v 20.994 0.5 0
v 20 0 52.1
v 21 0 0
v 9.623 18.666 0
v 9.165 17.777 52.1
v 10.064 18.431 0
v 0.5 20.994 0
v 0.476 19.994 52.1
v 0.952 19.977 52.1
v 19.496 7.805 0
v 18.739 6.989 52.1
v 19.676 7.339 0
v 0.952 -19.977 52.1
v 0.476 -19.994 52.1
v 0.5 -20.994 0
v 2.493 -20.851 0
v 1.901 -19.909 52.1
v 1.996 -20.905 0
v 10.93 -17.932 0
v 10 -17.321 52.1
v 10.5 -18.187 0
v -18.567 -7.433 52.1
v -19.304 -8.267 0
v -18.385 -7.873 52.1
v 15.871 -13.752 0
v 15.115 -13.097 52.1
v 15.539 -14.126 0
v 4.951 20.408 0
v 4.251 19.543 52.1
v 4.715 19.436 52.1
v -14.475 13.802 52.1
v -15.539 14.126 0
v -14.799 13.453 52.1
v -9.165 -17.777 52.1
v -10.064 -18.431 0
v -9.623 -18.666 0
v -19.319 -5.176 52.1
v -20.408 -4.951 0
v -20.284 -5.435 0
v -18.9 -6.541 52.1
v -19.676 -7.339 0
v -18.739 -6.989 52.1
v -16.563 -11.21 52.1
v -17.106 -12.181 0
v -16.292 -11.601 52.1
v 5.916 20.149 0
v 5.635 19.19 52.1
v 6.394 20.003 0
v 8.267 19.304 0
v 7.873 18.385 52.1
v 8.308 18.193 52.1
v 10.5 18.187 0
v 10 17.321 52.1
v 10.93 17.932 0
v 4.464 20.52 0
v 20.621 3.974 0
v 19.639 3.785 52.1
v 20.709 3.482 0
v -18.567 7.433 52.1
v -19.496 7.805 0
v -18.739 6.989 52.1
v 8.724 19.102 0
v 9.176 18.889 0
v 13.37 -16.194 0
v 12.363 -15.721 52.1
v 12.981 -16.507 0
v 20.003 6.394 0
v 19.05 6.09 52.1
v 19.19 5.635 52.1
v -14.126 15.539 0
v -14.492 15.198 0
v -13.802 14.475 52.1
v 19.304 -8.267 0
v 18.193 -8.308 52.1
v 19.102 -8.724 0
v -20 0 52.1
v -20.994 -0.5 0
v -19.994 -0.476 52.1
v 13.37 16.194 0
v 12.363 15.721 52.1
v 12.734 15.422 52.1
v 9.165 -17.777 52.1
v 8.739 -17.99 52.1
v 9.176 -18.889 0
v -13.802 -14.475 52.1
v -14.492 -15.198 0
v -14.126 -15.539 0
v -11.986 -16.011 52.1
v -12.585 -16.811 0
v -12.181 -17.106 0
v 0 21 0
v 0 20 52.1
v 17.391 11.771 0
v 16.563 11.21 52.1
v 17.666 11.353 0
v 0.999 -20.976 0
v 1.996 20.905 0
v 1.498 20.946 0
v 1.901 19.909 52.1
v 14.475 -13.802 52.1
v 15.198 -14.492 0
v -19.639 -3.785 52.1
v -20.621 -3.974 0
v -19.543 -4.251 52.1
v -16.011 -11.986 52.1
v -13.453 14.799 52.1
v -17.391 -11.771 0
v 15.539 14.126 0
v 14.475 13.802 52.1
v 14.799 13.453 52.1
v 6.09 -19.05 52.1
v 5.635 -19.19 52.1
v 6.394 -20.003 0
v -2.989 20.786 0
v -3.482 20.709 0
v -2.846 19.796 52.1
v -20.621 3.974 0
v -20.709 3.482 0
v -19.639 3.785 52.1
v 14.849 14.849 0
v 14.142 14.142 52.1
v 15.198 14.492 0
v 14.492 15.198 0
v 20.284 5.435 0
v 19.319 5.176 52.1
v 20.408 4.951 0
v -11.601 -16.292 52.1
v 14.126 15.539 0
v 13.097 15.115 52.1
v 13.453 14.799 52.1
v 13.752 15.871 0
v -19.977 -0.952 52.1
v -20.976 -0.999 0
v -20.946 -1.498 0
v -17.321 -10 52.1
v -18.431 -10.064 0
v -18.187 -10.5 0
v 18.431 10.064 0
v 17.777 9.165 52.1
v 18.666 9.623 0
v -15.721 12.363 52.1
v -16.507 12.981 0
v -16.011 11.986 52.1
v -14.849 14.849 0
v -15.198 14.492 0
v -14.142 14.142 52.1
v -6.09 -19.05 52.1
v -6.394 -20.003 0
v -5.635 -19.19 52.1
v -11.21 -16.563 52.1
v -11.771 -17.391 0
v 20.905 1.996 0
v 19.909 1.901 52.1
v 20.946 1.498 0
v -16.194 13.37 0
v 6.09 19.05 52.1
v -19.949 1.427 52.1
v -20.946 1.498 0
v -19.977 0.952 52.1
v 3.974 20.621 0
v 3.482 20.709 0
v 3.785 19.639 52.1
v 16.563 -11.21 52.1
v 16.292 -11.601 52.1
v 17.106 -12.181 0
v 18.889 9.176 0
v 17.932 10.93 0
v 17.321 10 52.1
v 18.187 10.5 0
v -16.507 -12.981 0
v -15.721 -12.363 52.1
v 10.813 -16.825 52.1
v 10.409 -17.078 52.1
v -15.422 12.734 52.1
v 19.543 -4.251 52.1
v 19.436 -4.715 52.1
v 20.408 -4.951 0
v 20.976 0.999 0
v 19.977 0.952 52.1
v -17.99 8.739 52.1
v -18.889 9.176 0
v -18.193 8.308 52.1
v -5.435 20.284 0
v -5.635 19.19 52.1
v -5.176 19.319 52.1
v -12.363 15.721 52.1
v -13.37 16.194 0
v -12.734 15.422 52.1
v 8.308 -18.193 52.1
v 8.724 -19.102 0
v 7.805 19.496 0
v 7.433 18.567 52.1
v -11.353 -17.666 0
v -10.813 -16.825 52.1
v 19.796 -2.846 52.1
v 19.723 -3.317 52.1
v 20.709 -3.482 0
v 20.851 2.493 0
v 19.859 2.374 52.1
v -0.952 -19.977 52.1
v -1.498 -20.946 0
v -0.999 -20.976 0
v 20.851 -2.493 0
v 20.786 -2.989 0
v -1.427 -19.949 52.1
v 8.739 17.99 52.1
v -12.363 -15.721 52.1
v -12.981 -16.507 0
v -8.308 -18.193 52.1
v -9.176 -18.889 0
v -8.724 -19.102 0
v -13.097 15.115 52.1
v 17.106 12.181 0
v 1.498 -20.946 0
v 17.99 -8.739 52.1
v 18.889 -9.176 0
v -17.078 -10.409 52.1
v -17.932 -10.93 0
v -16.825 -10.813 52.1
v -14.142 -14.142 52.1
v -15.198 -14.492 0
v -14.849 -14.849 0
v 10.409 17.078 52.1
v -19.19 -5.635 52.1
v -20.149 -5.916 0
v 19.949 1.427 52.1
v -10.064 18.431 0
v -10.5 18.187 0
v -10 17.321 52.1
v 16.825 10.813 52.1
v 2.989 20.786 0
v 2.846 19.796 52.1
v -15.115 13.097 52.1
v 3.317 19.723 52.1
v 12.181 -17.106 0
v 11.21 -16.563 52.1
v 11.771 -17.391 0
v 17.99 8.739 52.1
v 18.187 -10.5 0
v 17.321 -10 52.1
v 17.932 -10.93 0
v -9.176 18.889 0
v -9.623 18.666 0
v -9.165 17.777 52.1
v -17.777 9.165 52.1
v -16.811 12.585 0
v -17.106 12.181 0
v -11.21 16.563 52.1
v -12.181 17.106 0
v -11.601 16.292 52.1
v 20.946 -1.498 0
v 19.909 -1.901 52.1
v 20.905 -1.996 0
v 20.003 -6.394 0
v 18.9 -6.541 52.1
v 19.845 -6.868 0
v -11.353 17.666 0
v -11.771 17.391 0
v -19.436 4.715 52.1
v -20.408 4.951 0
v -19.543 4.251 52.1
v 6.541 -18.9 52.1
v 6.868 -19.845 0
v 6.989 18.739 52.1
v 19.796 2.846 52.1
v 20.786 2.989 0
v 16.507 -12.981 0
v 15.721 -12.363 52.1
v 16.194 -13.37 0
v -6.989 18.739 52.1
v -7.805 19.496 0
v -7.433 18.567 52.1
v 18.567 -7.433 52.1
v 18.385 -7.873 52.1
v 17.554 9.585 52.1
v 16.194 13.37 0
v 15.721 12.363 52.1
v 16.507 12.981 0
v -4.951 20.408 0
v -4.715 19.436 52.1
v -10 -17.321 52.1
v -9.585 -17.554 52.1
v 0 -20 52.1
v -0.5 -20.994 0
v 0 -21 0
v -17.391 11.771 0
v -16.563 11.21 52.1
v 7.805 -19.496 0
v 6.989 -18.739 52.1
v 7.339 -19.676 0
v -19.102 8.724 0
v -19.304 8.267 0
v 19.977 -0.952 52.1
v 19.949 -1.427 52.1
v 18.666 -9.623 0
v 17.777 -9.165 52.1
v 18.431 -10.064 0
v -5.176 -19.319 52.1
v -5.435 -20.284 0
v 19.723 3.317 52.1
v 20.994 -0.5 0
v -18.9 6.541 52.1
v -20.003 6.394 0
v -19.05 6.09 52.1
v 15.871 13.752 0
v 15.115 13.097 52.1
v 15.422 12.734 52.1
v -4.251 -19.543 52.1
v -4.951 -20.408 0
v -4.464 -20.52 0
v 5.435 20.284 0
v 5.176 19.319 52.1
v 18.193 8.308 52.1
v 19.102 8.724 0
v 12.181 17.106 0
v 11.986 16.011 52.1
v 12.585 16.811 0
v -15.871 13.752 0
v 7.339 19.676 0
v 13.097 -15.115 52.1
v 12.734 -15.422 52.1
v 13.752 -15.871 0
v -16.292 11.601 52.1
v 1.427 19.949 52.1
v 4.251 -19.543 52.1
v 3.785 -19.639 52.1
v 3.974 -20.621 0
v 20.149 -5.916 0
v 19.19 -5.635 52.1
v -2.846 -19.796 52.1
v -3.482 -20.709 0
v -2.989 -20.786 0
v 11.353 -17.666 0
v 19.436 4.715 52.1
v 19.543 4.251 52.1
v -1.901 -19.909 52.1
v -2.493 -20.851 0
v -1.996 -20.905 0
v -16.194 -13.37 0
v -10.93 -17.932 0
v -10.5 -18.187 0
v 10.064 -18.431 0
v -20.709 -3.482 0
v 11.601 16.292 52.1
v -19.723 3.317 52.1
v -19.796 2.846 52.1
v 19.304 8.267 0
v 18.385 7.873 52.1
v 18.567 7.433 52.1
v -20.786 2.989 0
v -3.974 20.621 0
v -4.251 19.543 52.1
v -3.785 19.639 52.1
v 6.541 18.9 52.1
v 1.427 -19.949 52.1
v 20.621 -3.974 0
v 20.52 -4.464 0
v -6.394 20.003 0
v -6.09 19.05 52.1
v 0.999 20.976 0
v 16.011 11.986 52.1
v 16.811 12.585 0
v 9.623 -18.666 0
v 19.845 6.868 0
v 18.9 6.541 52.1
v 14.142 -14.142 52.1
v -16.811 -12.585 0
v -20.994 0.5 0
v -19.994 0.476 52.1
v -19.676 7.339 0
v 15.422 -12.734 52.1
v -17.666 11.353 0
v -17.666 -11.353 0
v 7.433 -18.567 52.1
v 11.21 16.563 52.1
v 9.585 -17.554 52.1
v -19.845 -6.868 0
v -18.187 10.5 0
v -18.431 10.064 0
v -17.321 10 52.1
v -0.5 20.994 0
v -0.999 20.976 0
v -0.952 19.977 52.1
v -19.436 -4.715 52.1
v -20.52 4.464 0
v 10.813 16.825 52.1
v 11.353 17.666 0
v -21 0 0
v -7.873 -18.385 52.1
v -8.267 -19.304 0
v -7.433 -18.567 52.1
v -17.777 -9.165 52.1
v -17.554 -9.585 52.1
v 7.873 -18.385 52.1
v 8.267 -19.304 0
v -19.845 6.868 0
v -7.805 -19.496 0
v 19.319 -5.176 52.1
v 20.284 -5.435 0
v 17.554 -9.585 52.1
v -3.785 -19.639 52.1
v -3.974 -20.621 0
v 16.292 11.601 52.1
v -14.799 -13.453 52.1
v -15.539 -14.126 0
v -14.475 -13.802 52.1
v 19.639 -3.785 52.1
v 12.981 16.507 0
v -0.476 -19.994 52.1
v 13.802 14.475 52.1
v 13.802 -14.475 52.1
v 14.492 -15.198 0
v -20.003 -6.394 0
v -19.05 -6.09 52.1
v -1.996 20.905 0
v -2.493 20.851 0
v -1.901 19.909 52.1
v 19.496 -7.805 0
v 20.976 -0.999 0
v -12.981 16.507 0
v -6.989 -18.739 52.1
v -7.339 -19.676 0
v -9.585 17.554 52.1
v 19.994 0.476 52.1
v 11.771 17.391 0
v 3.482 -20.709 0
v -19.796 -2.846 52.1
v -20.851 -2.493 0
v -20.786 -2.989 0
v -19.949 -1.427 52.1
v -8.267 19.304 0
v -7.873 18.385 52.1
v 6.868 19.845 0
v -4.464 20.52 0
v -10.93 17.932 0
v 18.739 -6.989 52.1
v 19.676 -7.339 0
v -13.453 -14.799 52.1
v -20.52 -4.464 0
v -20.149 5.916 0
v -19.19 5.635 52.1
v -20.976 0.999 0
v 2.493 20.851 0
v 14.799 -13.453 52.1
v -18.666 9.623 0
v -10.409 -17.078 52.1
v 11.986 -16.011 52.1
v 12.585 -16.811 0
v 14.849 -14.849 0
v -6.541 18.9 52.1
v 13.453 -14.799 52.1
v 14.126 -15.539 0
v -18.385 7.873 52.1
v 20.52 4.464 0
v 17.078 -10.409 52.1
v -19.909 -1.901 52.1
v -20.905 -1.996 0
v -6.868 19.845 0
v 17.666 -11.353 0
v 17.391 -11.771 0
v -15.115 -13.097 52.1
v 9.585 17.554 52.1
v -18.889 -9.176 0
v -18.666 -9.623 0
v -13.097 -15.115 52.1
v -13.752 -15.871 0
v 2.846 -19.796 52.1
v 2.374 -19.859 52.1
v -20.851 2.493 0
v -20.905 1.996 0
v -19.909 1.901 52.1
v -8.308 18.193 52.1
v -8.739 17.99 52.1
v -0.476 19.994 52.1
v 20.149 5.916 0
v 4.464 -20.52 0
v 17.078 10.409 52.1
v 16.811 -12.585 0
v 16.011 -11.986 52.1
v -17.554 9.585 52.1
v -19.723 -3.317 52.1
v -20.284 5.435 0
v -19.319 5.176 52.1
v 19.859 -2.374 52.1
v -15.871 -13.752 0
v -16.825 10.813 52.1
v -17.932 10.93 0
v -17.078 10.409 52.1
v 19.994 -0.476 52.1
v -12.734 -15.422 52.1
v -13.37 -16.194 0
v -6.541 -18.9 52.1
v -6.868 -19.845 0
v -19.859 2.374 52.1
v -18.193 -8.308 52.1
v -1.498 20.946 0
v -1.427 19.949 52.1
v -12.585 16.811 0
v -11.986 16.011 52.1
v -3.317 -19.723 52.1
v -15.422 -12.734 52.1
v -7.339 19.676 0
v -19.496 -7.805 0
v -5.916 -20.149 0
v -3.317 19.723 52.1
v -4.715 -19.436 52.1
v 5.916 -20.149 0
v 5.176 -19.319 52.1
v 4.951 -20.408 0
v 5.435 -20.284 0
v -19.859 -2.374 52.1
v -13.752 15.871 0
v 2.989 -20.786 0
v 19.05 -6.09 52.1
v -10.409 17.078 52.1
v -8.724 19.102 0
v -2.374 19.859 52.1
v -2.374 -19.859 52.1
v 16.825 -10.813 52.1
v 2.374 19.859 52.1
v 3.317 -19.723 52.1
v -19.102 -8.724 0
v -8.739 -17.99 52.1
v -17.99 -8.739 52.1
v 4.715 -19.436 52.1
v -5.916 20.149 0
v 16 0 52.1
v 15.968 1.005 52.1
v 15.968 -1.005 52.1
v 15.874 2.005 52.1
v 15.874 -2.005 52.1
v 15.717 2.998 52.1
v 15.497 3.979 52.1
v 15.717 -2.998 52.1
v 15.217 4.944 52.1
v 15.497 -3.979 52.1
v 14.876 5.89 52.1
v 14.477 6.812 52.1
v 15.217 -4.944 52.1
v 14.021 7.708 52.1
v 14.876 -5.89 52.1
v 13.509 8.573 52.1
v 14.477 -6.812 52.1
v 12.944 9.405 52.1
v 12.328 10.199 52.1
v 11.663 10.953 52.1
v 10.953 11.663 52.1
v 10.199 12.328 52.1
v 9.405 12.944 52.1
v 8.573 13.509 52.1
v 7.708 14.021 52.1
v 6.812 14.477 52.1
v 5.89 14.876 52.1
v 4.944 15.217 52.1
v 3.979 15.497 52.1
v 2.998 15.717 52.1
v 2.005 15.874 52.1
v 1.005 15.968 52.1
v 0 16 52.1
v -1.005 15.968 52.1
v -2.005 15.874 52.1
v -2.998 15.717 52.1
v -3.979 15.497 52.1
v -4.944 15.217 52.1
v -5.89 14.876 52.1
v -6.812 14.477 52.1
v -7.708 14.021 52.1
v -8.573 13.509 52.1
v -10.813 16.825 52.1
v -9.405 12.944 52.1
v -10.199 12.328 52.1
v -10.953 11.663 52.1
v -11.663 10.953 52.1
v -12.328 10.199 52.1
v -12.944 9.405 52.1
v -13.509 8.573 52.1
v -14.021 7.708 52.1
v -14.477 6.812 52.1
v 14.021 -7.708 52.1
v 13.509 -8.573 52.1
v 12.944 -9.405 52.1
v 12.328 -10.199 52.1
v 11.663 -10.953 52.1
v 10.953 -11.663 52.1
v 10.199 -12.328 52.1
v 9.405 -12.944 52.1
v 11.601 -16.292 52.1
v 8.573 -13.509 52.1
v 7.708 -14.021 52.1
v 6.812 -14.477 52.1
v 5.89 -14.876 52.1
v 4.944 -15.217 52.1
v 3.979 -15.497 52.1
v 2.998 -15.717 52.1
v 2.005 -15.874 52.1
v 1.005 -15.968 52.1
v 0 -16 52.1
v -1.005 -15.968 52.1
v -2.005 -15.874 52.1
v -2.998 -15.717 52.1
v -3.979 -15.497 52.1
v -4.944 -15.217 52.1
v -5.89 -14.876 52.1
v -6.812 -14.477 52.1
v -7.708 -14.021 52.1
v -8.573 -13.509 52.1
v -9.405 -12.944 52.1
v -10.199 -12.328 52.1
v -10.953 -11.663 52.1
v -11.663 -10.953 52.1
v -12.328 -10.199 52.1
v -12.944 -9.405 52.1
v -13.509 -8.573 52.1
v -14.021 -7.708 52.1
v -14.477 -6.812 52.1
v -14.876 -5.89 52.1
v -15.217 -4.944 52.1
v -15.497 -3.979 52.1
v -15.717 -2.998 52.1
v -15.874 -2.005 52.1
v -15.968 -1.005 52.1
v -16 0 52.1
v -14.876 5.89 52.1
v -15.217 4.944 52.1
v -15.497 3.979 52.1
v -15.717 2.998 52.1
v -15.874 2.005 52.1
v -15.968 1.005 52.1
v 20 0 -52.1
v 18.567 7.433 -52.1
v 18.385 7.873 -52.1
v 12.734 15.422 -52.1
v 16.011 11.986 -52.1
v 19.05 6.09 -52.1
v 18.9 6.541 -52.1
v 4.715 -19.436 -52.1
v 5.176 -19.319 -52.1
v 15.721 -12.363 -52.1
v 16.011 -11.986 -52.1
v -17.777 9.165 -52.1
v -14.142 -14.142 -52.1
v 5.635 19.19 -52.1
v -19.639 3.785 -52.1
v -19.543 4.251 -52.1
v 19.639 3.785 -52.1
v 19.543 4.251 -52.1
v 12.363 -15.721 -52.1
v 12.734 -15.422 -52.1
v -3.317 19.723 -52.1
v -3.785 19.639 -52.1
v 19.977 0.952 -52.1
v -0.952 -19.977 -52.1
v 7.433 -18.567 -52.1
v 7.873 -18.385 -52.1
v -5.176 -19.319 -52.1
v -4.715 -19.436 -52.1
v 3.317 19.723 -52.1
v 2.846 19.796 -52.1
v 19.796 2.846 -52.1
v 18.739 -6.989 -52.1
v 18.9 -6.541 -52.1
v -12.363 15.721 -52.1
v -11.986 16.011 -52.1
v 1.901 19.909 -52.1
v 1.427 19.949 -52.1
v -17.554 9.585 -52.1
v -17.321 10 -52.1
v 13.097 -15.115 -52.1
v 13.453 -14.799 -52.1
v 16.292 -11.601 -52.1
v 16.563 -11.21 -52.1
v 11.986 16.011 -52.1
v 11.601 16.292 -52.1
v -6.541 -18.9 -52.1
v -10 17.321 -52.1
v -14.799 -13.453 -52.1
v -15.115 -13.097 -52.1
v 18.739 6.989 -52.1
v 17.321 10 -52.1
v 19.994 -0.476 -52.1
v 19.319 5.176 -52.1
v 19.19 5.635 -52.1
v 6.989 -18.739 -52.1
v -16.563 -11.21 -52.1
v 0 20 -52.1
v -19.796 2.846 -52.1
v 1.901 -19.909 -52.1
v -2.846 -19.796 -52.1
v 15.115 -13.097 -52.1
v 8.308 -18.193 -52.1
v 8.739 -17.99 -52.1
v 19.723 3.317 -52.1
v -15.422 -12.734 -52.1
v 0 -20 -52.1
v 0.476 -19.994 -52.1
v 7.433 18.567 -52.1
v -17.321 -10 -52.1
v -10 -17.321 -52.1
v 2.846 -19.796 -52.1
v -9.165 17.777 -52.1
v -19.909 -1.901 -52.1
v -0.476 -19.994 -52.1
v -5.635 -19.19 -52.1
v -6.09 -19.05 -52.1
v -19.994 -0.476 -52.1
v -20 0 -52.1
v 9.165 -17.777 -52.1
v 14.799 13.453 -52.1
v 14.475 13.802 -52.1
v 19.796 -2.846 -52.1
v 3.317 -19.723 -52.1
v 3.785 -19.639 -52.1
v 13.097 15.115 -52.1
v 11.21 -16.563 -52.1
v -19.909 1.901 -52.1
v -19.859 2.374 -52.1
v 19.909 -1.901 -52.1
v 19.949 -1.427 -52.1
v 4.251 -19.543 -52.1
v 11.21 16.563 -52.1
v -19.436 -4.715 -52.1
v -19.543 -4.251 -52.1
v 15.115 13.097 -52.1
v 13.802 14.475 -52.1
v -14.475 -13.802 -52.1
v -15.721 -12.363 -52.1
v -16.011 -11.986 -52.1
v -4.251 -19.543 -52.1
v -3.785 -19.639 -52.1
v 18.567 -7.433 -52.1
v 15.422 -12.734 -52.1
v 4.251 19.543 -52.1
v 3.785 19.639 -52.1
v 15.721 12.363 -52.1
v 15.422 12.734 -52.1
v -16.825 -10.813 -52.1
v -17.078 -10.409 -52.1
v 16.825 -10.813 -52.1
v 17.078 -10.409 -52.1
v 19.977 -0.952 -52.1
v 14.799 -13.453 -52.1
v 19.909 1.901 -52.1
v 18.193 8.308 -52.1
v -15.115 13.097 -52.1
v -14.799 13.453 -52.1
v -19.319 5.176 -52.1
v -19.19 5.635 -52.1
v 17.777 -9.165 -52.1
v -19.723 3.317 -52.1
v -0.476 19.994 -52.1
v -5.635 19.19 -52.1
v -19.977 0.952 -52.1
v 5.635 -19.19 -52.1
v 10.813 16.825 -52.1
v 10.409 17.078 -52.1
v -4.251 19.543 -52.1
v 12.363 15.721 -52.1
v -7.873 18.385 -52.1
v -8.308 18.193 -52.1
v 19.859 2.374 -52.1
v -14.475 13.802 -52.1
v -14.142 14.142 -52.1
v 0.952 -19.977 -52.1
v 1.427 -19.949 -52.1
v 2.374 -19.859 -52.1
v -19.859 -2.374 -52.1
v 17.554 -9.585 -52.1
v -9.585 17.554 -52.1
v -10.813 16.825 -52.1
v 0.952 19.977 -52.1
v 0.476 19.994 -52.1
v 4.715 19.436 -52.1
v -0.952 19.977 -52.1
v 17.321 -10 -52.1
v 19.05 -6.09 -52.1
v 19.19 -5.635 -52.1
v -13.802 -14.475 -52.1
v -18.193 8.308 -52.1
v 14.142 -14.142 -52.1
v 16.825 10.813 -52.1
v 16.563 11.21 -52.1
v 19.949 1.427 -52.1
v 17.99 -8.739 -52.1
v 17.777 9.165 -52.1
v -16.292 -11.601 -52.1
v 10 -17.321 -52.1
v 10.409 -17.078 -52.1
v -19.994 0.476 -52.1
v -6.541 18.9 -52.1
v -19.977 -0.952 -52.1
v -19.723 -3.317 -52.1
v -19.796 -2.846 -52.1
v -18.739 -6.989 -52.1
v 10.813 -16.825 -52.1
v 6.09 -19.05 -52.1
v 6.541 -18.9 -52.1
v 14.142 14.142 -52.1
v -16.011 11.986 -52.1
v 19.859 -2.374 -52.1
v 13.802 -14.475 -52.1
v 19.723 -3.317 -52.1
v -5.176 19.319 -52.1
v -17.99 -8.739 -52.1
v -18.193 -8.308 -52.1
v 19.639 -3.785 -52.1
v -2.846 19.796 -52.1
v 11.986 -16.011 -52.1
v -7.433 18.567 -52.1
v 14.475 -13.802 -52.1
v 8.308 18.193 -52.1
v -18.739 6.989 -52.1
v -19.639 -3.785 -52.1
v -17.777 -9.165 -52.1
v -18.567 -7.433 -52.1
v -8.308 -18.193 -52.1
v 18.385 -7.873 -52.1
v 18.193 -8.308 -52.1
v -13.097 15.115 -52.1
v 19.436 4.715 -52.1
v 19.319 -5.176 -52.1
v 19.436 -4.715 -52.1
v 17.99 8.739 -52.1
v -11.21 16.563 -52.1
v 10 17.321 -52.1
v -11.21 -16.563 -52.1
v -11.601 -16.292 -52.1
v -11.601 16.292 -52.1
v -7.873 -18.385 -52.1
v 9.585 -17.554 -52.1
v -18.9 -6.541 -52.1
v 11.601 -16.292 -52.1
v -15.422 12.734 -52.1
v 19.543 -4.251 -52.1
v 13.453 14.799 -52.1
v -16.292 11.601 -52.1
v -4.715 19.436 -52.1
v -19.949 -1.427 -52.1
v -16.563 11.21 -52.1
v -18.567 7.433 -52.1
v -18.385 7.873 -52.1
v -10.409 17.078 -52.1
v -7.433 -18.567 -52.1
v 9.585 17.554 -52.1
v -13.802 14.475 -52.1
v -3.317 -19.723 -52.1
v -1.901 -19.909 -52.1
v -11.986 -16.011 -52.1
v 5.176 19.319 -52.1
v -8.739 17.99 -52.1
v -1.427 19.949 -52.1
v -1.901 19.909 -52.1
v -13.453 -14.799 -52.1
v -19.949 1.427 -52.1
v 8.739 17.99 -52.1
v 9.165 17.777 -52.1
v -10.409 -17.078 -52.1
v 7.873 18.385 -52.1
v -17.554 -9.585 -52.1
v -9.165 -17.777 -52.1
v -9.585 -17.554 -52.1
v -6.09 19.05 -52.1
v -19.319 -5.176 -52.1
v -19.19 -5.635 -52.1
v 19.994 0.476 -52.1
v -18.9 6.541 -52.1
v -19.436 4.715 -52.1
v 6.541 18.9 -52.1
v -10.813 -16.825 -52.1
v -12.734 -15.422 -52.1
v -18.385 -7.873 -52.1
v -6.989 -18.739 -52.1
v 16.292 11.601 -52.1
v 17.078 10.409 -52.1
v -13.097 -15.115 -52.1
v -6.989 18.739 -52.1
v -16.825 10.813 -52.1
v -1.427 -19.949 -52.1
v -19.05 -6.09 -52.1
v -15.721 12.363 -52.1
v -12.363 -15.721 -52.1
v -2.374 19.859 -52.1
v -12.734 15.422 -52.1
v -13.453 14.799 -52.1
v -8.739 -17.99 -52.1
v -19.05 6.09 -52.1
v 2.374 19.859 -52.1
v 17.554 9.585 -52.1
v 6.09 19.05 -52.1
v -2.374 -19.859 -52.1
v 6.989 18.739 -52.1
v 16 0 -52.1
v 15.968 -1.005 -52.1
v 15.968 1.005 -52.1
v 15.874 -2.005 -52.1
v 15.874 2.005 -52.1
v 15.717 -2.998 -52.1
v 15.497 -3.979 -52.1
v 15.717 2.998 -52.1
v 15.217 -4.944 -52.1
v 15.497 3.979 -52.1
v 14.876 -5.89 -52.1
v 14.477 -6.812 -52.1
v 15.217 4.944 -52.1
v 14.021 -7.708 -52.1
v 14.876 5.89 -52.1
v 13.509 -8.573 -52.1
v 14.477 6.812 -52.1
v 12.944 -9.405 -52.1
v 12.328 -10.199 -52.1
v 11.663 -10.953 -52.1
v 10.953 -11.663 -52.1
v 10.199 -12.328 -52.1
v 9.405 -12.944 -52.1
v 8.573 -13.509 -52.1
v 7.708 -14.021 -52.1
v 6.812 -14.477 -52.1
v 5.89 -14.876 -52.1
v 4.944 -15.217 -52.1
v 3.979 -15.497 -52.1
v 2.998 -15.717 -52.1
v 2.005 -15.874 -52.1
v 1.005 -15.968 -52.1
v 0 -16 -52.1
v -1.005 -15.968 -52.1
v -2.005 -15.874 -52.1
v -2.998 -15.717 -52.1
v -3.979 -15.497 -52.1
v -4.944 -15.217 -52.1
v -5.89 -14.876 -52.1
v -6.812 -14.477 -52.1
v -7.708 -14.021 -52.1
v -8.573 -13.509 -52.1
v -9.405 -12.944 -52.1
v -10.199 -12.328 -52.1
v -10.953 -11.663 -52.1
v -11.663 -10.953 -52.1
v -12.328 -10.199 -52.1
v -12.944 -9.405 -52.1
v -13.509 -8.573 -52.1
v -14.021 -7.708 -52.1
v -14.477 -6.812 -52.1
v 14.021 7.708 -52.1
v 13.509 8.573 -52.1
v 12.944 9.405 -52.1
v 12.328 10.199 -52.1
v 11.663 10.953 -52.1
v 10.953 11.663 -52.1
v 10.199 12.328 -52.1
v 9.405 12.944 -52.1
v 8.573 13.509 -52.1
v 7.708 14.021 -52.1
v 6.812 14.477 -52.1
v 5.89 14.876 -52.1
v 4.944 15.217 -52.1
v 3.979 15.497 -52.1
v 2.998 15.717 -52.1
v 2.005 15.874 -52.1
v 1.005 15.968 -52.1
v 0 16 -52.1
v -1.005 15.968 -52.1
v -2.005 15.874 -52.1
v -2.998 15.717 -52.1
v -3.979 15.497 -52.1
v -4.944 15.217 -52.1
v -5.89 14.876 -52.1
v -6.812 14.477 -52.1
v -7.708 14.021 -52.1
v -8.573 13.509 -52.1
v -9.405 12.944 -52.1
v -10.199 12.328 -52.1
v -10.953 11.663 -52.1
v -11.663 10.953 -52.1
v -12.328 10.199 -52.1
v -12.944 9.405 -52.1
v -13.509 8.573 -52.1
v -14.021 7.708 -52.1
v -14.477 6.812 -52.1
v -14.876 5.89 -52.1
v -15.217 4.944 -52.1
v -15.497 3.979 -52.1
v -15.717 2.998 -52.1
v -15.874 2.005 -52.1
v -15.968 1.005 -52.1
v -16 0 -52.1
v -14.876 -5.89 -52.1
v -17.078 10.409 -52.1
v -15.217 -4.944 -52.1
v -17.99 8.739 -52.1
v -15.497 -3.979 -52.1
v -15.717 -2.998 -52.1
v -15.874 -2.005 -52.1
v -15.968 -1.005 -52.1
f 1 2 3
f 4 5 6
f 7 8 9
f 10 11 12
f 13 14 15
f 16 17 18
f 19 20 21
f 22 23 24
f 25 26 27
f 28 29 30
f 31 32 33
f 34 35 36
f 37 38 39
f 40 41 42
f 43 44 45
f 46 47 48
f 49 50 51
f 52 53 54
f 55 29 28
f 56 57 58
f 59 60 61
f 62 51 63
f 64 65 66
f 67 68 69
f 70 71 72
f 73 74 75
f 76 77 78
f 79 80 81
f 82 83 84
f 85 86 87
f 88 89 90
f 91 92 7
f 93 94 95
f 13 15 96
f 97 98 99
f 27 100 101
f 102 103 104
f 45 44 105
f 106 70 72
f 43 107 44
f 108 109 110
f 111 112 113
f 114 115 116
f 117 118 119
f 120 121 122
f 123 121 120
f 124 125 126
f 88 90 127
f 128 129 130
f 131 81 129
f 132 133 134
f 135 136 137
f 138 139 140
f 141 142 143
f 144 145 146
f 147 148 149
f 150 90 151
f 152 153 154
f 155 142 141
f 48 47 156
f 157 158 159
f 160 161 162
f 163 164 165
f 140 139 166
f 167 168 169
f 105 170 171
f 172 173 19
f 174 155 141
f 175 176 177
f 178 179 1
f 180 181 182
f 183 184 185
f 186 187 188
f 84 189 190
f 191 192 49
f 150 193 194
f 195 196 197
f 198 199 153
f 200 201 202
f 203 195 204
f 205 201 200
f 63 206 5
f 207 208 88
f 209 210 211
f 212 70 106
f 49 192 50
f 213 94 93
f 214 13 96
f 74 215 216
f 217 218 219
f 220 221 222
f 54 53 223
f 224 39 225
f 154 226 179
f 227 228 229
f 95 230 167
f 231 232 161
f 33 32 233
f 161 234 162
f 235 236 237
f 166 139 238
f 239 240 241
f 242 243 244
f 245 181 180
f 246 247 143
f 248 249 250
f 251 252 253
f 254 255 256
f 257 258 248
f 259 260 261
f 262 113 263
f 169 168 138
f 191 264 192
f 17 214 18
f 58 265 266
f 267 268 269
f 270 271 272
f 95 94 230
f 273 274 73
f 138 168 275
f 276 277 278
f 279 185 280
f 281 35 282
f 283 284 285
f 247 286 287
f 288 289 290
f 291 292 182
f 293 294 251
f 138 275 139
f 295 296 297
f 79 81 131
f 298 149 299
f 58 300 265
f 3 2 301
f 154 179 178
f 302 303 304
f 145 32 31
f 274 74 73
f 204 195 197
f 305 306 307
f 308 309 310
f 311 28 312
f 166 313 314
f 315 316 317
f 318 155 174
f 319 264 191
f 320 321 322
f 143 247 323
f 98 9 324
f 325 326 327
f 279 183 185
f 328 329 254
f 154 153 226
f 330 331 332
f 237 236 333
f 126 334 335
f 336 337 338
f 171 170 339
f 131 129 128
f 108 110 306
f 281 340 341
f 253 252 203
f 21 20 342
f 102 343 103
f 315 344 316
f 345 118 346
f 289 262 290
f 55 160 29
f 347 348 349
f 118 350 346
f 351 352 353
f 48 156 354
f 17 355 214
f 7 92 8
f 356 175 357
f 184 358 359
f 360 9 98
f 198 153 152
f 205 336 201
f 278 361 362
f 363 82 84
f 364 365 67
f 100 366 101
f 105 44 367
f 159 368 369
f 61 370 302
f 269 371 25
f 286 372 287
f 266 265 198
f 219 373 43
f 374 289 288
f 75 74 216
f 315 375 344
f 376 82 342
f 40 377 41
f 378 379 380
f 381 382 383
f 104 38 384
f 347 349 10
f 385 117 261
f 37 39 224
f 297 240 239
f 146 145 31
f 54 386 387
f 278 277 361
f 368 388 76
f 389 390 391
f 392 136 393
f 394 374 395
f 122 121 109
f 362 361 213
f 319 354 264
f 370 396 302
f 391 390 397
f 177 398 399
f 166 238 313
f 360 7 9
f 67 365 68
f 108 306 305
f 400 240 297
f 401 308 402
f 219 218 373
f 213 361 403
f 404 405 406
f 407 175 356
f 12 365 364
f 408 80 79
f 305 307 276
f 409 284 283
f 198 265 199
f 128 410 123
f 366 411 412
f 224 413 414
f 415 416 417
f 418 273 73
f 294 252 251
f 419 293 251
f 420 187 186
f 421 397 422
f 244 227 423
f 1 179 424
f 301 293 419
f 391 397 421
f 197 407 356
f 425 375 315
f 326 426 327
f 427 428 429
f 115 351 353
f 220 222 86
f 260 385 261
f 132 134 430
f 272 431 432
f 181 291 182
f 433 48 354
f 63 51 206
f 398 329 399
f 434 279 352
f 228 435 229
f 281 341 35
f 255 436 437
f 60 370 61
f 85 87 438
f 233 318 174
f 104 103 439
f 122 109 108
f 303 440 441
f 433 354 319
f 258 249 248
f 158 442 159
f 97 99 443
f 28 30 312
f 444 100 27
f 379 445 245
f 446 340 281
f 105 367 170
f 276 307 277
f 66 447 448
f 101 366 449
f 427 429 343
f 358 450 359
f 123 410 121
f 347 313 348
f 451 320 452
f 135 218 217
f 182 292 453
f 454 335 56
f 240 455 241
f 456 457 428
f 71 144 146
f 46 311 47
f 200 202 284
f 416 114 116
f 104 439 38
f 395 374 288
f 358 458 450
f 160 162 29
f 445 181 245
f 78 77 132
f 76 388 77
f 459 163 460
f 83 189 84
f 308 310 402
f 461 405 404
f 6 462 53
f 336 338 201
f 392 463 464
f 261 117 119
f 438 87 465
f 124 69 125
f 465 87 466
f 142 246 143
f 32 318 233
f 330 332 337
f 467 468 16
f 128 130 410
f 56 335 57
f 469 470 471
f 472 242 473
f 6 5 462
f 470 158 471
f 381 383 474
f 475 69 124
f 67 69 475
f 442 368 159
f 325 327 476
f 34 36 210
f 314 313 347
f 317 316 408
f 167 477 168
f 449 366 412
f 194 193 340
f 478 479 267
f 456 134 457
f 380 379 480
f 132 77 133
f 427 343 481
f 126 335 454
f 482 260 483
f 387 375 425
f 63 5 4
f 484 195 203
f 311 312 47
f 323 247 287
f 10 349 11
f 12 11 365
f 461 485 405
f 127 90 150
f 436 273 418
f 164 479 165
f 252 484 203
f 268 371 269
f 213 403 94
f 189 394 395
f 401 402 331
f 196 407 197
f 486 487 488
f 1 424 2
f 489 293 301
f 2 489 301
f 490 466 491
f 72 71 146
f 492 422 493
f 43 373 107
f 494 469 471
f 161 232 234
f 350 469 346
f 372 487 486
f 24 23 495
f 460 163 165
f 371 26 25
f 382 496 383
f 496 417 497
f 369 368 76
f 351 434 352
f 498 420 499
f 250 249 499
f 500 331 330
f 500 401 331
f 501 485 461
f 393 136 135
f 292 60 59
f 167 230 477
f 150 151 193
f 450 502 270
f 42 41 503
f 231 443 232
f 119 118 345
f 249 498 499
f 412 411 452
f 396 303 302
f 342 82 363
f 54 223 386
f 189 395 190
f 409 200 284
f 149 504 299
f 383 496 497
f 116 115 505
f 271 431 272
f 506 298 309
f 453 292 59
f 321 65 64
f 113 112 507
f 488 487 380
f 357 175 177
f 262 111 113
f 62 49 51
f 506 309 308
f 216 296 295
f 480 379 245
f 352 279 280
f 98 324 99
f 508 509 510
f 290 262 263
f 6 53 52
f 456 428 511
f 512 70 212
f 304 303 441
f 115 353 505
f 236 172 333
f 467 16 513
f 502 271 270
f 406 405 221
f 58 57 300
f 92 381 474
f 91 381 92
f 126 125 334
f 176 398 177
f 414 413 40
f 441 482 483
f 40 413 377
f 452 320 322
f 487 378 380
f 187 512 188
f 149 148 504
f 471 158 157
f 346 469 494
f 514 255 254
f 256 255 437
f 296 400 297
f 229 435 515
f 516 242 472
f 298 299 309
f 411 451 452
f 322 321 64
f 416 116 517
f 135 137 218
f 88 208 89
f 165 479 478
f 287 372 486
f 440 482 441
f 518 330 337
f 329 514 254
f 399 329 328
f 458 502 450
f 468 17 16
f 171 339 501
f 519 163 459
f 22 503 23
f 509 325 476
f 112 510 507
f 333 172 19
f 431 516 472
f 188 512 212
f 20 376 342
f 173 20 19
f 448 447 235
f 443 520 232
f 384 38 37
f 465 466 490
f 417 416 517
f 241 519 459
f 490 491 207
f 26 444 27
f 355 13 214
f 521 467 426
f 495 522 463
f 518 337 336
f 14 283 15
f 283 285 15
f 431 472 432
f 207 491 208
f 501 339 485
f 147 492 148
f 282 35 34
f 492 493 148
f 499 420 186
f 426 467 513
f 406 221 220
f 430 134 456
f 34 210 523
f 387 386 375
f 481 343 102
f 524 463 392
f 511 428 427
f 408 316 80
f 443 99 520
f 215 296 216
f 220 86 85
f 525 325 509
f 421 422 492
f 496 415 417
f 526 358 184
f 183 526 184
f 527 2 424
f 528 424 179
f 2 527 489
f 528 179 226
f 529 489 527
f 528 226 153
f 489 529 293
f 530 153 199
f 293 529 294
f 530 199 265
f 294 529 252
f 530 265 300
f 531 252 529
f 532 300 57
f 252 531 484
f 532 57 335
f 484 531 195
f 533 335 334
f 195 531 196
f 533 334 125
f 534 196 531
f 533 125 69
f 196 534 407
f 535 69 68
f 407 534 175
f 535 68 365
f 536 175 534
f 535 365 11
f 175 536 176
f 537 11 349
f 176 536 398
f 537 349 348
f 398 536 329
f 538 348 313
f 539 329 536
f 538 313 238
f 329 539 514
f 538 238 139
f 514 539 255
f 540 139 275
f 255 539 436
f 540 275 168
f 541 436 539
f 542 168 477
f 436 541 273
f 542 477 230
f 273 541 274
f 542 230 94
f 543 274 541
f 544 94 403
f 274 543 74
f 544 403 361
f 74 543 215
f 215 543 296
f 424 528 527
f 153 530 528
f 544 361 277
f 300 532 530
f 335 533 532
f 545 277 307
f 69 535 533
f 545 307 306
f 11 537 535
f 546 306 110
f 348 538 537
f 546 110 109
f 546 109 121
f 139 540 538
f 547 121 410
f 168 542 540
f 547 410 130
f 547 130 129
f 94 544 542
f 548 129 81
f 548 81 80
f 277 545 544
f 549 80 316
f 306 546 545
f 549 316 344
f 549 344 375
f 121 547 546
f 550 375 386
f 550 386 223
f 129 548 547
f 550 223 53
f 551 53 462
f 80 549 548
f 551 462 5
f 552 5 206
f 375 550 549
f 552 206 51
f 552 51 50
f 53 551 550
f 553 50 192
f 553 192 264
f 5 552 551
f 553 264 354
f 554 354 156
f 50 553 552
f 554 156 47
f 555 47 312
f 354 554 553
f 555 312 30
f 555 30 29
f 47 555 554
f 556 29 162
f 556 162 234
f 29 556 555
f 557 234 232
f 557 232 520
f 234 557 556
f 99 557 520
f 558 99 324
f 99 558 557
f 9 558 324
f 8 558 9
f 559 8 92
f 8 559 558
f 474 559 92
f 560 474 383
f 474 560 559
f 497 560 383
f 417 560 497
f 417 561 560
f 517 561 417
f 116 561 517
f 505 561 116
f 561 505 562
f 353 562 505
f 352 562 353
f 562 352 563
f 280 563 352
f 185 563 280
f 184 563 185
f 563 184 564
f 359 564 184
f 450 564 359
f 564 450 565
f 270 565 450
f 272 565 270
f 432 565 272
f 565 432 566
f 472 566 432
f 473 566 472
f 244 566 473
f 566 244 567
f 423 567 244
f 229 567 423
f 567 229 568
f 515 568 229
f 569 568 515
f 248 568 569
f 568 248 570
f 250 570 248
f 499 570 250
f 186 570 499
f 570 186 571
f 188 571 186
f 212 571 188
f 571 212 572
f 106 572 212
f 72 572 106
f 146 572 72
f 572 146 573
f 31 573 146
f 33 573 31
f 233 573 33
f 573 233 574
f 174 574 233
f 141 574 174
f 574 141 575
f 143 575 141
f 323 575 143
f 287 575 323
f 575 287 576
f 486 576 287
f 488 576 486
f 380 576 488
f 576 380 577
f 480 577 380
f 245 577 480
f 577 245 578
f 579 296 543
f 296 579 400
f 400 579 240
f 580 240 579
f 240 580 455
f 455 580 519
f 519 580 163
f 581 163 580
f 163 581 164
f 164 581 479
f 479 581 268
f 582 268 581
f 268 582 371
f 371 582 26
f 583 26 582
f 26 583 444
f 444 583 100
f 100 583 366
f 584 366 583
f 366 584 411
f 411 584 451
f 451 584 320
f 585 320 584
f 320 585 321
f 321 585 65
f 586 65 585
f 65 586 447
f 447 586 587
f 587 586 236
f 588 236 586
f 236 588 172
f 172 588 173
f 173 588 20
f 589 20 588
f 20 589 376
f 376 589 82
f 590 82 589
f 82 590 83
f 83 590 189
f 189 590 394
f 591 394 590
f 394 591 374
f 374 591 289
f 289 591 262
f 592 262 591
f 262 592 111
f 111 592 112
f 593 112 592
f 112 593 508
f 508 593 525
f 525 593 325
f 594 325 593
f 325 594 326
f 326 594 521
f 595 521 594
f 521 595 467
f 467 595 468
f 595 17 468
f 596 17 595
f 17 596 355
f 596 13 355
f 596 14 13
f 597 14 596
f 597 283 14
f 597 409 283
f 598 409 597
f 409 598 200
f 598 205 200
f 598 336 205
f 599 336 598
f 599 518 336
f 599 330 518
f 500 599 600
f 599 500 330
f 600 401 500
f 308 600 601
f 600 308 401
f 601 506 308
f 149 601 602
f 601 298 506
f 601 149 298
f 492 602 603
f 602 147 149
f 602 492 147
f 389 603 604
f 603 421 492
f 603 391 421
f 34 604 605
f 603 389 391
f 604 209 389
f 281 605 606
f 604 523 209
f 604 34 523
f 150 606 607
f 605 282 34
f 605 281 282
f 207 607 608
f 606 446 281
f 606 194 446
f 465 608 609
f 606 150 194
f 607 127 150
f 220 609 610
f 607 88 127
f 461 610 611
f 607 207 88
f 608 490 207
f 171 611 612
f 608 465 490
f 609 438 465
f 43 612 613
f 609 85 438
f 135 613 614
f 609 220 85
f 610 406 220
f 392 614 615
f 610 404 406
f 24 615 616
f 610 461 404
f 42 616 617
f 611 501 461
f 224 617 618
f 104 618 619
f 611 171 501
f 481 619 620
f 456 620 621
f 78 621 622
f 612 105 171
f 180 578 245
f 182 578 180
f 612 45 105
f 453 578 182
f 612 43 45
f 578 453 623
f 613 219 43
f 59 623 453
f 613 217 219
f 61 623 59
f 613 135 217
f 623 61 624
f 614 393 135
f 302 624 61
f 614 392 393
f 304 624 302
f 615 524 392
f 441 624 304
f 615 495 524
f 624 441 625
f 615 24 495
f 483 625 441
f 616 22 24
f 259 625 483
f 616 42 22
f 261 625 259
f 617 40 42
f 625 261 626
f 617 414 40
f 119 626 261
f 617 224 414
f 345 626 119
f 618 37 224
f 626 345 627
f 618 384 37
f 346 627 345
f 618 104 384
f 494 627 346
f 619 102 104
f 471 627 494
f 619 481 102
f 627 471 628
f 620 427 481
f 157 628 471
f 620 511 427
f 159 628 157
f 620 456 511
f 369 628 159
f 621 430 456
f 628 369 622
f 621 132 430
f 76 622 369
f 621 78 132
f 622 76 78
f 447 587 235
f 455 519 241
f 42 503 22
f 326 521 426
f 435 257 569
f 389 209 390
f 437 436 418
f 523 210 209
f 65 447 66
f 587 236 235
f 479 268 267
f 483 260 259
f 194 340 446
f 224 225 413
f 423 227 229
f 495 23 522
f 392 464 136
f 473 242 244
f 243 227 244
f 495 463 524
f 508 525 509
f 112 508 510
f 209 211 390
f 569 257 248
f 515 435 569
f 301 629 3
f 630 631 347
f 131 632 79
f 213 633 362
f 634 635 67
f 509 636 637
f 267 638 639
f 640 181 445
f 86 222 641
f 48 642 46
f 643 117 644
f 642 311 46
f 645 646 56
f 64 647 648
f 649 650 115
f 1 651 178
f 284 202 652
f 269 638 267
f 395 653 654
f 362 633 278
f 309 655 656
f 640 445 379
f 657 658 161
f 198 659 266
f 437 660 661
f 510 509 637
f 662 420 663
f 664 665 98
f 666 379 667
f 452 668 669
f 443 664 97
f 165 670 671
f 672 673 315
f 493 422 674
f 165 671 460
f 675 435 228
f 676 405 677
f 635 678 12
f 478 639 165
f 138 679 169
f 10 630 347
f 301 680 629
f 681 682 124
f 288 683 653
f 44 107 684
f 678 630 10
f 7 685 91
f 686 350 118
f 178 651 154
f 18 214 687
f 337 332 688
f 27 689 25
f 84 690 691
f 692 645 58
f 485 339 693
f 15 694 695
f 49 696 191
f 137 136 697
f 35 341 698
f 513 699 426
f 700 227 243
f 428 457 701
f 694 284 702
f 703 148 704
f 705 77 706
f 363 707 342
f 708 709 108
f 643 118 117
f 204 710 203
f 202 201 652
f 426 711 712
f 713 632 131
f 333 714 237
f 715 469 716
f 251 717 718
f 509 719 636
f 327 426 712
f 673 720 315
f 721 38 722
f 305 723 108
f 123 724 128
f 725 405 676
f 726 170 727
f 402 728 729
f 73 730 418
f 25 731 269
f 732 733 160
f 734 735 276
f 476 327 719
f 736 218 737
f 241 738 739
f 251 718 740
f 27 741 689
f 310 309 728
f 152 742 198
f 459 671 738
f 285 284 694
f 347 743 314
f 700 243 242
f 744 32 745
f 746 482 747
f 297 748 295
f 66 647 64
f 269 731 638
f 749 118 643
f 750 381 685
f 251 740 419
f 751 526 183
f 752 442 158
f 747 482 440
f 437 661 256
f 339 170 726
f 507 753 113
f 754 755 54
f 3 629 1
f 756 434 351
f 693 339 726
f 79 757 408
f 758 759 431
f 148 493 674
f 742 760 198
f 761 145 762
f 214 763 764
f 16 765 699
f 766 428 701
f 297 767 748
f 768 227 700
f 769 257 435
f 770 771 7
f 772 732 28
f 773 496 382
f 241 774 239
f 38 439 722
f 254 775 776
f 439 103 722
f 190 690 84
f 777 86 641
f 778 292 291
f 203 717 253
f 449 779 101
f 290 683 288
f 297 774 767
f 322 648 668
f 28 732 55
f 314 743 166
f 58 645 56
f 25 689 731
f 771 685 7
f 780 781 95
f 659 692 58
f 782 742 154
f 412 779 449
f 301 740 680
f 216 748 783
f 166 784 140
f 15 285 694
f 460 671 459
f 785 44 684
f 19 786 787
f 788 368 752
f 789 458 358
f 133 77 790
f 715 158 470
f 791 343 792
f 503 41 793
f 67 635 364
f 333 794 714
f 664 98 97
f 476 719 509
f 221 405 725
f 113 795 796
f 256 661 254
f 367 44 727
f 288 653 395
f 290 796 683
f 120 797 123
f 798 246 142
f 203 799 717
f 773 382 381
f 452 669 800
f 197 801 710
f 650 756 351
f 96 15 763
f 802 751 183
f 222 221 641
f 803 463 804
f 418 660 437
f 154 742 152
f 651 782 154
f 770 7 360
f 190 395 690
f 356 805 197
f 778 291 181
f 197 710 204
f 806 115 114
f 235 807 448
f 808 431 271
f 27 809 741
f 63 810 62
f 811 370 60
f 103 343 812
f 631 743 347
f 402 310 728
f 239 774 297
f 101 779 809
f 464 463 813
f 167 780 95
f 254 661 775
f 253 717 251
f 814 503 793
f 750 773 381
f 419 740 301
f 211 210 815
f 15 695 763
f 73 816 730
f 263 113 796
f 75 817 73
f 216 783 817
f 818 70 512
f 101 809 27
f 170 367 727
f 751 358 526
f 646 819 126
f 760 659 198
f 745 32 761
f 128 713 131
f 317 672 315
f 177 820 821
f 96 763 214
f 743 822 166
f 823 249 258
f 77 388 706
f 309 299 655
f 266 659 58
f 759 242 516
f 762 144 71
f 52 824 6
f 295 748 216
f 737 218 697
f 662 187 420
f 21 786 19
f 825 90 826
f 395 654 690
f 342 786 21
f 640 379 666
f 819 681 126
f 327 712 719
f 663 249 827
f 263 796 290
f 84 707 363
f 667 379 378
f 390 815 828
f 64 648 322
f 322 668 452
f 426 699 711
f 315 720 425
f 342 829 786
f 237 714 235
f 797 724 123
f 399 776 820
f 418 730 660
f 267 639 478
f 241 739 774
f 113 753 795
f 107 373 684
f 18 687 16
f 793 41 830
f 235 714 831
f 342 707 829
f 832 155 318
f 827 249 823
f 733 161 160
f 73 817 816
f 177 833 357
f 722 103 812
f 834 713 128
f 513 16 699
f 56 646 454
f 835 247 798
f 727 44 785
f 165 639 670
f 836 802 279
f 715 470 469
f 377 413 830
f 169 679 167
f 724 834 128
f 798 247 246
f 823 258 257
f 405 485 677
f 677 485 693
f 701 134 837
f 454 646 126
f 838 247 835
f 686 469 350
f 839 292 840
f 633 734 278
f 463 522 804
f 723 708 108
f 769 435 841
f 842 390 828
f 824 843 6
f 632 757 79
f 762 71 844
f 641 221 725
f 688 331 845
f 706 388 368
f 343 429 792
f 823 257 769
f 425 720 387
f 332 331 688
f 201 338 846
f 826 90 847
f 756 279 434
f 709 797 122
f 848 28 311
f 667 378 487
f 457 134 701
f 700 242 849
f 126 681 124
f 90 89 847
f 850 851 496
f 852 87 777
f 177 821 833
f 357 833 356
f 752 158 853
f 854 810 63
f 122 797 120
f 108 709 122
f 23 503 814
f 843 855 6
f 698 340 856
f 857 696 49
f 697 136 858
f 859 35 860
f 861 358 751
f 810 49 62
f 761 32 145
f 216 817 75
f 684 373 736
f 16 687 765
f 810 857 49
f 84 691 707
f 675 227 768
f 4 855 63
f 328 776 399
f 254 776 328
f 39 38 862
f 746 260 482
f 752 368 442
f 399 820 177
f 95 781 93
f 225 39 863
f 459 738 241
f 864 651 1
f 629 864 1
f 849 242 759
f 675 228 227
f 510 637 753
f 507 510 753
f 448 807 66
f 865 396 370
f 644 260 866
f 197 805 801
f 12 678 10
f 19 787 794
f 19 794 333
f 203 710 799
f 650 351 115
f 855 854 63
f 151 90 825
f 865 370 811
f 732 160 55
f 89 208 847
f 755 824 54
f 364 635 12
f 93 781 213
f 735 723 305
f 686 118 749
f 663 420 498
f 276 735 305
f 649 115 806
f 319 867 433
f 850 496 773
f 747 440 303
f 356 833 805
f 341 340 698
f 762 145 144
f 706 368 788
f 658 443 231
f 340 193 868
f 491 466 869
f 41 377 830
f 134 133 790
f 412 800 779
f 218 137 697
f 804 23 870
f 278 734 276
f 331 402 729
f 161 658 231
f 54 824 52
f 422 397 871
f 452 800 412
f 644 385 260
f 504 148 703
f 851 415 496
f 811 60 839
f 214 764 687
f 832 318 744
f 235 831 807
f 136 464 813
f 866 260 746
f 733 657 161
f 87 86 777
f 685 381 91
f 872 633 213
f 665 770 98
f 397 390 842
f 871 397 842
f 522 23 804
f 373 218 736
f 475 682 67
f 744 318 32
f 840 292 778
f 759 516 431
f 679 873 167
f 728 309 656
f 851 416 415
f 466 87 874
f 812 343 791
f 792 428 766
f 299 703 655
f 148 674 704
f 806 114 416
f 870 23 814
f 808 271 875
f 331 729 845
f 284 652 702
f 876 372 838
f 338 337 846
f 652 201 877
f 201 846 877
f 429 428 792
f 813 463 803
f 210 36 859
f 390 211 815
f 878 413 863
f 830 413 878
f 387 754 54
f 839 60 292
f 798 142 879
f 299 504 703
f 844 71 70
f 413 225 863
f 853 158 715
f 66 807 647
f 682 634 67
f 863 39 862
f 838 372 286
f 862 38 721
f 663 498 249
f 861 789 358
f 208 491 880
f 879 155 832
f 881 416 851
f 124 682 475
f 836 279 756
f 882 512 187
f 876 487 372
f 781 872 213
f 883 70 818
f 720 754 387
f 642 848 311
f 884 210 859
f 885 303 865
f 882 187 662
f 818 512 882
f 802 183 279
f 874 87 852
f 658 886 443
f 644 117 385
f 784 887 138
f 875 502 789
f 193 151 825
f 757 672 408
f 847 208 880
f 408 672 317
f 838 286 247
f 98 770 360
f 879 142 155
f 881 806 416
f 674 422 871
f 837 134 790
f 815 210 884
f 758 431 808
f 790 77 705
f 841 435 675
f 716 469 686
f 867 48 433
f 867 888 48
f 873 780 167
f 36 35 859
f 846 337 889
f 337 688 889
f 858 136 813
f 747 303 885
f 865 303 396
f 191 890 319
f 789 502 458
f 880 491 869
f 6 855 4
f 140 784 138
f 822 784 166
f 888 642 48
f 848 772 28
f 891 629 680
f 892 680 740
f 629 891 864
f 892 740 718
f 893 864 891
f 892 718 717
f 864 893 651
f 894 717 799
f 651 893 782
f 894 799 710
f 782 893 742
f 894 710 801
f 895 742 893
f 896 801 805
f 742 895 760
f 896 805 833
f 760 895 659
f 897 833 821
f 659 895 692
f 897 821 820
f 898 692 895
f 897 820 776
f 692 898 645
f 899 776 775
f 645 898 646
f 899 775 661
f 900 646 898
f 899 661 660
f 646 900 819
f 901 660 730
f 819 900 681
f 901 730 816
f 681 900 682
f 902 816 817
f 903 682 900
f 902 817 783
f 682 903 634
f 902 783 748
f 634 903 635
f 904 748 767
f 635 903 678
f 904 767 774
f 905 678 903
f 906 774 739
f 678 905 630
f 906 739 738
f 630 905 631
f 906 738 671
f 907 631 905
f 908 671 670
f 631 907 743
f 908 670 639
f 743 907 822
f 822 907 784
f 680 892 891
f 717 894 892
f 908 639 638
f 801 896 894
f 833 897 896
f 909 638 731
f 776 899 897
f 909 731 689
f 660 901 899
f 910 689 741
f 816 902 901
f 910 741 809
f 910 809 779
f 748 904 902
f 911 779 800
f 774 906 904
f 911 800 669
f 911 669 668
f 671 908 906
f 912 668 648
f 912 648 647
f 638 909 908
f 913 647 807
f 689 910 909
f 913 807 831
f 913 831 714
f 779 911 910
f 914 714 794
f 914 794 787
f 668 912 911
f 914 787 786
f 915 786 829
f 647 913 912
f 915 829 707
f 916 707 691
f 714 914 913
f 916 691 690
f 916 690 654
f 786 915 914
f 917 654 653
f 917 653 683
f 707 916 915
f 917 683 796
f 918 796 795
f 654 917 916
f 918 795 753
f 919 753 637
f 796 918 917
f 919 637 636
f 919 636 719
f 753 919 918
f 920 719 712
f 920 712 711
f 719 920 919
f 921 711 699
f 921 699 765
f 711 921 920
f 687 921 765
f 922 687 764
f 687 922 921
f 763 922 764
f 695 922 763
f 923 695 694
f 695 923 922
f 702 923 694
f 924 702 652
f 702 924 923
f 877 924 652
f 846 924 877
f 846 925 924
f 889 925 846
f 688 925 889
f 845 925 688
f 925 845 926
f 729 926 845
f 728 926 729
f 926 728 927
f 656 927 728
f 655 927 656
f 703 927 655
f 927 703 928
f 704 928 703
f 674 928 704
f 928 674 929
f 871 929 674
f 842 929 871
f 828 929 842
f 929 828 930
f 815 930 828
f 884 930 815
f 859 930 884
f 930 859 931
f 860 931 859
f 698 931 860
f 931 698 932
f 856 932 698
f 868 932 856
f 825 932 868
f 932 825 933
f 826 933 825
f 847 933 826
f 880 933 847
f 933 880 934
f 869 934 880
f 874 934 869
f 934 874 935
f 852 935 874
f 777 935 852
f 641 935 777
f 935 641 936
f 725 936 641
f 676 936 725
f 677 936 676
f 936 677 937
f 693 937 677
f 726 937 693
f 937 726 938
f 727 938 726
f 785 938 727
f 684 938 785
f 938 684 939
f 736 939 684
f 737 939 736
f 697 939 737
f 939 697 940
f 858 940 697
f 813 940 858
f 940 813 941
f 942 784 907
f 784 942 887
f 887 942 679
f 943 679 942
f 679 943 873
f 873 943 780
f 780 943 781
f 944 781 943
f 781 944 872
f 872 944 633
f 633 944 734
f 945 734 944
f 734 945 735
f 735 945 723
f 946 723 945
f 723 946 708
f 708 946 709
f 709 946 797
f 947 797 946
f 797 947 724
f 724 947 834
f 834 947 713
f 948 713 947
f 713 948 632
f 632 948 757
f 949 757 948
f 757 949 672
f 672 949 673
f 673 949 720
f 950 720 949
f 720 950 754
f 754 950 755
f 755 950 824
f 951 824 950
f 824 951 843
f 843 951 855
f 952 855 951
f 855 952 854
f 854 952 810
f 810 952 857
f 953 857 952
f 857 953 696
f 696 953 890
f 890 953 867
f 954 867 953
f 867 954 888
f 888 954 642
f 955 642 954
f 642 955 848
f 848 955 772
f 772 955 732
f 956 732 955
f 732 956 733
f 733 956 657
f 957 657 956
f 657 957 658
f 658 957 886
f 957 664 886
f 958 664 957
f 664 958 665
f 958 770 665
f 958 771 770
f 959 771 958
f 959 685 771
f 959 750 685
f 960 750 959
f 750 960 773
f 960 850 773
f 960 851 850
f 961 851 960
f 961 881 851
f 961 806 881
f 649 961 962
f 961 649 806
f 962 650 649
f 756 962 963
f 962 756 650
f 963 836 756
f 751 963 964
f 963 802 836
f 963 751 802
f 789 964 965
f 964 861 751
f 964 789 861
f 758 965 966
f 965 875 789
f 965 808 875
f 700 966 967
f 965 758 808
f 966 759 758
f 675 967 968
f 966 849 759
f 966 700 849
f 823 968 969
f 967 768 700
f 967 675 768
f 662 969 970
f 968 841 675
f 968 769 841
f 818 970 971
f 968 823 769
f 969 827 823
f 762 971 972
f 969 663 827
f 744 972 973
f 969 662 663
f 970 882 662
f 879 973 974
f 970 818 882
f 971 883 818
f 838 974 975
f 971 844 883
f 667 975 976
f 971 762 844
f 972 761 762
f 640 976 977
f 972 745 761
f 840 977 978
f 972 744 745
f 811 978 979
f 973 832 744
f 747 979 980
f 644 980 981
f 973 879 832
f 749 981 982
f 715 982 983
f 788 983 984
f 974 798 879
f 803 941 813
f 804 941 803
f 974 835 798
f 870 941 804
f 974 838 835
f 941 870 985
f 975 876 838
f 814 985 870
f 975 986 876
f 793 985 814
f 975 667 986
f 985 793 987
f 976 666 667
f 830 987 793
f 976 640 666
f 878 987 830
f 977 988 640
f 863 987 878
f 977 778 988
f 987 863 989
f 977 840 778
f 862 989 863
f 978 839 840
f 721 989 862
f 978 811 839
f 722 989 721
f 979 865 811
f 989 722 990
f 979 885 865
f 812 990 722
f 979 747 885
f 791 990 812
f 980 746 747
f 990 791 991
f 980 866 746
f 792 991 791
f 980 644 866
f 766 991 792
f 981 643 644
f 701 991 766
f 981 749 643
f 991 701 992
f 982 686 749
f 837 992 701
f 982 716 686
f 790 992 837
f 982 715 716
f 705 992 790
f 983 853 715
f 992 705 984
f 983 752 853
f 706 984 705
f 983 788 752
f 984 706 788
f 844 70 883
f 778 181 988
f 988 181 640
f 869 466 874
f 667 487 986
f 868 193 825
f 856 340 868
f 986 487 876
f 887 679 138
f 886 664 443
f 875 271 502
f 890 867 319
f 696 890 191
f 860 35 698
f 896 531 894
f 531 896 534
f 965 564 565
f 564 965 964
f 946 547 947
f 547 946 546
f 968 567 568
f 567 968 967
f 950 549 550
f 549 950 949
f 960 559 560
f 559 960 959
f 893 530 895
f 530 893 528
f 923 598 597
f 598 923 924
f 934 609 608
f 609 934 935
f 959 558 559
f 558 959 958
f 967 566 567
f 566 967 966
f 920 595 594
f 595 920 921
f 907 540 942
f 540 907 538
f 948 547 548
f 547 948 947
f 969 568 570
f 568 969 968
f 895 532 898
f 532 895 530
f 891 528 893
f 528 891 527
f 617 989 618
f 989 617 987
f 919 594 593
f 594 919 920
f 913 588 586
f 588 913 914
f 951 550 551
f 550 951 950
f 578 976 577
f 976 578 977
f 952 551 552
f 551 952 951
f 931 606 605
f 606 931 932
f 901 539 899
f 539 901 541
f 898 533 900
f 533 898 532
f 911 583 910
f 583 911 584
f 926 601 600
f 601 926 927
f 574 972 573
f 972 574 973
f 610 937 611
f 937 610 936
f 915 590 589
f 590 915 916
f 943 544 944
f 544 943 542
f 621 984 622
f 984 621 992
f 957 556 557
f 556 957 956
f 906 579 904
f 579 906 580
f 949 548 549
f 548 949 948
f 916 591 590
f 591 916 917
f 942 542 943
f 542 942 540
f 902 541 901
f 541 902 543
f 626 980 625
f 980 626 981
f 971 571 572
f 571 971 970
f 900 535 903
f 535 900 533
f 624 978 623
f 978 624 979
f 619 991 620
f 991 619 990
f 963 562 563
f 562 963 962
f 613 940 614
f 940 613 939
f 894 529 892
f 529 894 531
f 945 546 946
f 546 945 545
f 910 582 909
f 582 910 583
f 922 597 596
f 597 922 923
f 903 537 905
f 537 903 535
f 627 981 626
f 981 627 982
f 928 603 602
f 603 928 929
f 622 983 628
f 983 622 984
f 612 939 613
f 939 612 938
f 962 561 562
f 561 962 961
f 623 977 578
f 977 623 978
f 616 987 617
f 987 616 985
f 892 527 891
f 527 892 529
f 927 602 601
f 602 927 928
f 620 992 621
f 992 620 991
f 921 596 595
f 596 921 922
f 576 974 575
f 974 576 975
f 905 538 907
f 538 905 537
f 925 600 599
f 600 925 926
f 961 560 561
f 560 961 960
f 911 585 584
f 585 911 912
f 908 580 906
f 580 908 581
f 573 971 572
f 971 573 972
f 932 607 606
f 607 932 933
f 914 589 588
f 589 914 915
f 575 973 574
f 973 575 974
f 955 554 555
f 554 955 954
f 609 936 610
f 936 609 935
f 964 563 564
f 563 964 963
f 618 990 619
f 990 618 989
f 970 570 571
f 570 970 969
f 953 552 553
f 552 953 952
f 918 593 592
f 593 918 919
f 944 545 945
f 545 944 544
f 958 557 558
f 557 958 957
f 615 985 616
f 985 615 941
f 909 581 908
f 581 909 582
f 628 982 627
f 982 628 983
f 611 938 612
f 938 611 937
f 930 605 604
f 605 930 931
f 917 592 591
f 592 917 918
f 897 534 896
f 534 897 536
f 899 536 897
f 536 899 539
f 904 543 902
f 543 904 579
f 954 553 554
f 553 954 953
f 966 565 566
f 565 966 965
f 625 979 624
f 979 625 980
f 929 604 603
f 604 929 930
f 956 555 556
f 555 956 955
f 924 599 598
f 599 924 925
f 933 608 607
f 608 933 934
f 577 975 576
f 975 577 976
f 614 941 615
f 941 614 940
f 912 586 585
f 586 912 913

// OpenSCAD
$fa = 0.5;
$fs = 0.5;

outside_r = 42/2;
inside_r = 32/2;
outside_z = 104.2/2;

difference(){ 
	
	union(){
		cylinder(h=outside_z, r1= outside_r, r2= outside_r -1);
		rotate([180,0,0]) cylinder(h=outside_z, r1= outside_r, r2= outside_r -1);
	}
	
	translate([0,0,-.5]){
		cylinder(h=outside_z+1, r = inside_r, $fn=100);
	}
	rotate([180,0,0]) translate([0,0,-.5]){
		cylinder(h=outside_z+1, r = inside_r, $fn=100);
	}

}
